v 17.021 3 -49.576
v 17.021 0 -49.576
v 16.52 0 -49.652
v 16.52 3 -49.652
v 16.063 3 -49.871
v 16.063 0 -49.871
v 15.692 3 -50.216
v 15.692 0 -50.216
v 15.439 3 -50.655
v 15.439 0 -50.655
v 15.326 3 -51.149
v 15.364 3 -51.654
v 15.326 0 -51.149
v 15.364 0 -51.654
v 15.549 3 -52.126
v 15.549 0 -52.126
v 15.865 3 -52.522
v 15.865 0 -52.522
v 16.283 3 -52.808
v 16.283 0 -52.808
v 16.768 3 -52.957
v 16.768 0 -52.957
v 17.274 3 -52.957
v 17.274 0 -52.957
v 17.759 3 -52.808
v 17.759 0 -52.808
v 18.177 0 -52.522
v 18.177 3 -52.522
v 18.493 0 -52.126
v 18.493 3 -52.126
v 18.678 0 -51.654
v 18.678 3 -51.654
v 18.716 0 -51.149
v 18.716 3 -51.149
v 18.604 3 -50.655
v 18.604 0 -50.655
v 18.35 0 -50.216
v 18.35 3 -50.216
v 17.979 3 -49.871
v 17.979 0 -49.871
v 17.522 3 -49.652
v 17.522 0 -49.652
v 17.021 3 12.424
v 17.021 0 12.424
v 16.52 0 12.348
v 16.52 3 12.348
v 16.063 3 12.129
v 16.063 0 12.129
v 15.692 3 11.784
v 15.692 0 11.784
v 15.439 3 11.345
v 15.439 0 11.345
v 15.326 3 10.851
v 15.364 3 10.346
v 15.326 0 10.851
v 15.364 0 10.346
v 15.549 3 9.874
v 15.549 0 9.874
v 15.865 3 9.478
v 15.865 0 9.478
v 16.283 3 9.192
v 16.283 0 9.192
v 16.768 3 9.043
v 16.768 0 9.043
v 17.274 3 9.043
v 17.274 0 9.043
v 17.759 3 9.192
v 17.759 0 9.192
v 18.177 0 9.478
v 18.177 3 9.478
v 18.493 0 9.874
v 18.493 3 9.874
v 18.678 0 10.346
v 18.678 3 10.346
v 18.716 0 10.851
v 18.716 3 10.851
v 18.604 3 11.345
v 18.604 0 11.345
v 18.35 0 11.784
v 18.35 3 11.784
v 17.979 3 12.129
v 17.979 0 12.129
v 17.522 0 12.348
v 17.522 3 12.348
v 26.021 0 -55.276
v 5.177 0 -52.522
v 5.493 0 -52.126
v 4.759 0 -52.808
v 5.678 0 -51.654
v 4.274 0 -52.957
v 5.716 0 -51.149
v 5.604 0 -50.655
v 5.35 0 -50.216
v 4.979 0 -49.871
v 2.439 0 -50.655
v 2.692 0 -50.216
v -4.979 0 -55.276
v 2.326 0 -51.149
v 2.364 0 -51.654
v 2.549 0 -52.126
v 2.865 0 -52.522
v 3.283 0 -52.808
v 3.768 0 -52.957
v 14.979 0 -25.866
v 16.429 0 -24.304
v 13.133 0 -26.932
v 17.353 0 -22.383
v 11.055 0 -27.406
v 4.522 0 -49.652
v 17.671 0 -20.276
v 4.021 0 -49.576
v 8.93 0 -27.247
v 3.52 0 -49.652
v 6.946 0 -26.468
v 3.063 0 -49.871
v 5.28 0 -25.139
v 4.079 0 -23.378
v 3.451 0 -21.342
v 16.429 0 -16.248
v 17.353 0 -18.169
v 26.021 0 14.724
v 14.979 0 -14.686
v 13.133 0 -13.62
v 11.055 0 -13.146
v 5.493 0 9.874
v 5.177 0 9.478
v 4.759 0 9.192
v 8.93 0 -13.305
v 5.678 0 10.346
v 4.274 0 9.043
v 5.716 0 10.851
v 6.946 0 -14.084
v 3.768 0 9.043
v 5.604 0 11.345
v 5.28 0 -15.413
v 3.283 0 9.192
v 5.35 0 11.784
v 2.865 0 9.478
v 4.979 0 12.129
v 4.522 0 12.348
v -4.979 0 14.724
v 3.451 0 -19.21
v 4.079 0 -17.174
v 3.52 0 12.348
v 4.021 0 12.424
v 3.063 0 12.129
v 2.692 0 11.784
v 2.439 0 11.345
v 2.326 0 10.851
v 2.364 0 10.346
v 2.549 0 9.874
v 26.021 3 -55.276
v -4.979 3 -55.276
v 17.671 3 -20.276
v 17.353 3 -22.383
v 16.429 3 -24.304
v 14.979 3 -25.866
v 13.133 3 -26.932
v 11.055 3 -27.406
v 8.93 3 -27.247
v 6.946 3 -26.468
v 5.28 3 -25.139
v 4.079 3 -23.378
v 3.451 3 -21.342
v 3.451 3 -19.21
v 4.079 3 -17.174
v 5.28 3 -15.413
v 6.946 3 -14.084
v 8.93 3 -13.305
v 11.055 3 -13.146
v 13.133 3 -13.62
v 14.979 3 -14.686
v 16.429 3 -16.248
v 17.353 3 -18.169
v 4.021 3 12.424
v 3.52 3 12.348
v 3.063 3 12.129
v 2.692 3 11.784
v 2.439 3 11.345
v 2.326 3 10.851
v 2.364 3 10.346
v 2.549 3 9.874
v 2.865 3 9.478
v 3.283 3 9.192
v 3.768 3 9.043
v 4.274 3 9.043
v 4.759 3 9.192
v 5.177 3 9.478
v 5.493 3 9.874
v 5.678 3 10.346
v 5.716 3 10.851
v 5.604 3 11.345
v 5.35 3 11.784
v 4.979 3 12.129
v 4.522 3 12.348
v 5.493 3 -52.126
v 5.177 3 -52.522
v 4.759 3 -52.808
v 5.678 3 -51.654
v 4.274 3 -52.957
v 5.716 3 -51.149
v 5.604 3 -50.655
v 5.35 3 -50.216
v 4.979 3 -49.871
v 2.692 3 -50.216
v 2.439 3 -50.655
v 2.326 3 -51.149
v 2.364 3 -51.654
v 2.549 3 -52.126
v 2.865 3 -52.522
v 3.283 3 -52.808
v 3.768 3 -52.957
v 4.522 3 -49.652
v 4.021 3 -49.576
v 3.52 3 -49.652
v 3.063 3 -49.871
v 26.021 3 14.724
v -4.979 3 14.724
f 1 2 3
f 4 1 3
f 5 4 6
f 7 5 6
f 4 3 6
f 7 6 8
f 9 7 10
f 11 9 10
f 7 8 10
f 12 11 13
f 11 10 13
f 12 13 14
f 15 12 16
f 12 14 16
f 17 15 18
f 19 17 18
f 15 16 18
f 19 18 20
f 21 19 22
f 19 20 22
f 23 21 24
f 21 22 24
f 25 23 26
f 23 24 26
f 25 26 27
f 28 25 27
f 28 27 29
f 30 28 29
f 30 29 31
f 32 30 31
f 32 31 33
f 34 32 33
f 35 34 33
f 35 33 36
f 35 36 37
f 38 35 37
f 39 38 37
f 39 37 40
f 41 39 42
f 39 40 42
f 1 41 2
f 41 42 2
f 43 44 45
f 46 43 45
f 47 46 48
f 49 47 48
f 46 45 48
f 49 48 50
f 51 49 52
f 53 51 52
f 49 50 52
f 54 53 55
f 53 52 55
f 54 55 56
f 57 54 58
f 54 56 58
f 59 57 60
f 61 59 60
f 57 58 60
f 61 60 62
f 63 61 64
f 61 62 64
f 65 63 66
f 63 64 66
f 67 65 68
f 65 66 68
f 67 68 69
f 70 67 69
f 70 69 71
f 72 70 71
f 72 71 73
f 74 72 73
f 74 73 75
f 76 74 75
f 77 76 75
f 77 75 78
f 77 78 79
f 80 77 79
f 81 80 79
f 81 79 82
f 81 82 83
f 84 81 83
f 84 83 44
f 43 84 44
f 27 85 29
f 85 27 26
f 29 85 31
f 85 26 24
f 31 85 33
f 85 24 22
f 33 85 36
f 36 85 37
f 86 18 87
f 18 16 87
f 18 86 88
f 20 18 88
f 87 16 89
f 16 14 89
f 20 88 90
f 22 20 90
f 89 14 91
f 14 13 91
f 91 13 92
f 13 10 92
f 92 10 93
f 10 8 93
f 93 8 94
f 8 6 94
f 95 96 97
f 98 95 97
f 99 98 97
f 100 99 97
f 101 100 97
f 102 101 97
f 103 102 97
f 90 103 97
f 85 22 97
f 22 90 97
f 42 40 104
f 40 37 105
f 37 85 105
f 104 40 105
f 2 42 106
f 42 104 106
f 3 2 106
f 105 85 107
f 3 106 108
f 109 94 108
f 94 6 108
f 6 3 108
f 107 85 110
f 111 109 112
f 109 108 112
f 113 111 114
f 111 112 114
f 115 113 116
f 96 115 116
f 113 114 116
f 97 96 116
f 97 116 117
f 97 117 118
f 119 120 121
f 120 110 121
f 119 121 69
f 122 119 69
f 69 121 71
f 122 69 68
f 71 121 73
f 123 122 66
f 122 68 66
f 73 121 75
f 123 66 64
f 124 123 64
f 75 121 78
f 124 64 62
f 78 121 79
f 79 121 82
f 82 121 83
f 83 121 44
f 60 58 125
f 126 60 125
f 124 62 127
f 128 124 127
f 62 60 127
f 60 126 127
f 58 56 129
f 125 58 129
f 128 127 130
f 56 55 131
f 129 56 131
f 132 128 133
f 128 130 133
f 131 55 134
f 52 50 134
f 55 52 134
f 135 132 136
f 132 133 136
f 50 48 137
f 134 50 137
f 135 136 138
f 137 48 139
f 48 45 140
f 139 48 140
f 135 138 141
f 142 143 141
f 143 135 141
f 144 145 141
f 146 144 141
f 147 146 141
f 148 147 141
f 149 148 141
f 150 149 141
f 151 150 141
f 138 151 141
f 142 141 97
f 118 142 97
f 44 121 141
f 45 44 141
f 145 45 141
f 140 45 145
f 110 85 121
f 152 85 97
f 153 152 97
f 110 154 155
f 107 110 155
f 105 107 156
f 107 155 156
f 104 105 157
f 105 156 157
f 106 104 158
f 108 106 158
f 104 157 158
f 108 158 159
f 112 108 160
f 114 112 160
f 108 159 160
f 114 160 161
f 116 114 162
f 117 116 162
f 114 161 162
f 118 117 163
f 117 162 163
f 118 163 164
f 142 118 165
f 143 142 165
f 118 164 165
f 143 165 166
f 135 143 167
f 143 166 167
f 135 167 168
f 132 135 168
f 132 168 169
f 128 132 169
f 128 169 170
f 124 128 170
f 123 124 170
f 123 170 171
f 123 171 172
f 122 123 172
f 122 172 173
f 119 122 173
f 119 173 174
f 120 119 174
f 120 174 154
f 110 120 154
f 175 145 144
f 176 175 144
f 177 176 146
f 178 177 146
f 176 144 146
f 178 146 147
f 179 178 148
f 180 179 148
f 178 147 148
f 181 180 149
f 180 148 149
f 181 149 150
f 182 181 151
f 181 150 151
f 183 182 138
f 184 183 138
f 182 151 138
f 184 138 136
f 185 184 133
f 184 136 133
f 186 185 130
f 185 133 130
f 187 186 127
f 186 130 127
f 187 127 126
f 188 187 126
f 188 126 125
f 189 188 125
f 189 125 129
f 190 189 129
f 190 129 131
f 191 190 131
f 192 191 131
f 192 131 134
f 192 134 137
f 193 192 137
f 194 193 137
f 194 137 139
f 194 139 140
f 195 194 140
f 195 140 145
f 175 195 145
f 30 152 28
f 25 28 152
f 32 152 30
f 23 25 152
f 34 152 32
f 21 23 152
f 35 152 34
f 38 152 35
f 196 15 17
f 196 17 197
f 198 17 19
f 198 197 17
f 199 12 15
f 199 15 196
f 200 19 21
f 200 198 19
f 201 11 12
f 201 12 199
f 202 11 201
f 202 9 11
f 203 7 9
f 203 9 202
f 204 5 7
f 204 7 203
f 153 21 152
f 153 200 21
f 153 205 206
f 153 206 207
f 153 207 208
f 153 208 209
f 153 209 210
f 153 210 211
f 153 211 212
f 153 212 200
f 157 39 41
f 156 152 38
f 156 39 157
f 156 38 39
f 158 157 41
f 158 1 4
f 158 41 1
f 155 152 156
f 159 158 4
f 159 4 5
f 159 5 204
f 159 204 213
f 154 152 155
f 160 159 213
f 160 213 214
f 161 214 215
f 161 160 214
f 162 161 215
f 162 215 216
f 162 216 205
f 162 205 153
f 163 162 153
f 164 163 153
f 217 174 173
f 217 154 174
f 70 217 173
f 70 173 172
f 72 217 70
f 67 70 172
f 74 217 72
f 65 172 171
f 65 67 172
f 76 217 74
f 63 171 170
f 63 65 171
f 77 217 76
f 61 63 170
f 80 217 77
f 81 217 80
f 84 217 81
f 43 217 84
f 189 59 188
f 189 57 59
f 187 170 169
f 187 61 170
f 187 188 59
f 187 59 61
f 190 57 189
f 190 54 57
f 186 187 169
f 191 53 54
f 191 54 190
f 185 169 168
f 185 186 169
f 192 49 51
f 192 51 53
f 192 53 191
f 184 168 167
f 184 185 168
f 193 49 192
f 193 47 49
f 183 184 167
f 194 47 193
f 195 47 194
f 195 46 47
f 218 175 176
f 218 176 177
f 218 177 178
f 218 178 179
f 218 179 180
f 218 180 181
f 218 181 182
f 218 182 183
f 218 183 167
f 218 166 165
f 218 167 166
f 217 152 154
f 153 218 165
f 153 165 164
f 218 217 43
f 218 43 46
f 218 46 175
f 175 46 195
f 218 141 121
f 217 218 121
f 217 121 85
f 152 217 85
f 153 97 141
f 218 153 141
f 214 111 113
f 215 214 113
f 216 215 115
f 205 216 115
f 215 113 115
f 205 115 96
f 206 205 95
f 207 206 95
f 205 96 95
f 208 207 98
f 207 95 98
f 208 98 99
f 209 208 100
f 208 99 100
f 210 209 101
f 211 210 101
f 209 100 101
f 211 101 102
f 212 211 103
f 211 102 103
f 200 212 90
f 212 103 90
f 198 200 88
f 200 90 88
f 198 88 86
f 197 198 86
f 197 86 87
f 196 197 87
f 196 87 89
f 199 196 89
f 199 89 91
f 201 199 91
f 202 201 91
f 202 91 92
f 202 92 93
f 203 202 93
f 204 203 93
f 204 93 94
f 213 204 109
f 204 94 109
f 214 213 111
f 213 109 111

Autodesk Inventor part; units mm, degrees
ref_plane "YZ Plane" through (0, 0, 0) normal (1, 0, 0) x (0, 1, 0)
ref_plane "XZ Plane" through (0, 0, 0) normal (0, 1, 0) x (-1, 0, 0)
ref_plane "XY Plane" through (0, 0, 0) normal (0, 0, 1) x (1, 0, 0)
sketch "スケッチ1" plane through (0, 0, 0) normal (0, 1, 0) x (-1, 0, 0)
  line L0 (4.9789, 14.724) -> (-26.0211, 14.724)
  line L1 (-26.0211, 14.724) -> (-26.0211, -55.276)
  line L2 (-26.0211, -55.276) -> (4.9789, -55.276)
  line L3 (4.9789, -55.276) -> (4.9789, 14.724)
  point P0 (0, 0)
  dimension "d0" = 31
  dimension "d1" = 70
extrude "押し出し1" add sketch "スケッチ1" along normal blind 3
sketch "スケッチ2" plane through (0, 3, 0) normal (0, 1, 0) x (1, 0, 0)
  circle A0 centre (4.0211, -10.724) radius 1.7
  circle A1 centre (17.0211, -10.724) radius 1.7
  line L0 (-4.9789, 55.276) -> (-4.9789, -14.724) projected
  line L1 (26.0211, -14.724) -> (26.0211, 55.276) projected
  line L2 (-4.9789, -14.724) -> (26.0211, -14.724) projected
  circle A2 centre (4.0211, 51.276) radius 1.7
  line L3 (26.0211, 55.276) -> (-4.9789, 55.276) projected
  circle A3 centre (17.0211, 51.276) radius 1.7
  circle A4 centre (10.5211, 20.276) radius 7.15
  point P0 (0, 0)
  dimension "d4" = 3.4
  dimension "d5" = 3.4
  dimension "d6" = 9
  dimension "d7" = 9
  dimension "d8" = 4
  dimension "d9" = 4
  dimension "d10" = 3.4
  dimension "d11" = 9
  dimension "d12" = 4
  dimension "d13" = 3.4
  dimension "d14" = 9
  dimension "d15" = 4
  dimension "d16" = 14.3
  dimension "d17" = 35
  dimension "d18" = 15.5
hole "穴1" at (4.0211, 3, 10.724) at (17.0211, 3, 10.724) at (17.0211, 3, -51.276) at (4.0211, 3, -51.276) direction (0, -1, 0) diameter 3.4 depth 3
sketch "スケッチ3" plane through (0, 3, 0) normal (0, 1, 0) x (1, 0, 0)
  circle A0 centre (10.5211, 20.276) radius 7.15
  line L0 (-4.9789, 55.276) -> (-4.9789, -14.724) projected
  line L1 (-4.9789, -14.724) -> (26.0211, -14.724) projected
  point P0 (0, 0)
  dimension "d26" = 14.3
  dimension "d27" = 15.5
  dimension "d28" = 35
extrude "押し出し2" cut sketch "スケッチ3" against normal blind 3
properties part number "came1"
